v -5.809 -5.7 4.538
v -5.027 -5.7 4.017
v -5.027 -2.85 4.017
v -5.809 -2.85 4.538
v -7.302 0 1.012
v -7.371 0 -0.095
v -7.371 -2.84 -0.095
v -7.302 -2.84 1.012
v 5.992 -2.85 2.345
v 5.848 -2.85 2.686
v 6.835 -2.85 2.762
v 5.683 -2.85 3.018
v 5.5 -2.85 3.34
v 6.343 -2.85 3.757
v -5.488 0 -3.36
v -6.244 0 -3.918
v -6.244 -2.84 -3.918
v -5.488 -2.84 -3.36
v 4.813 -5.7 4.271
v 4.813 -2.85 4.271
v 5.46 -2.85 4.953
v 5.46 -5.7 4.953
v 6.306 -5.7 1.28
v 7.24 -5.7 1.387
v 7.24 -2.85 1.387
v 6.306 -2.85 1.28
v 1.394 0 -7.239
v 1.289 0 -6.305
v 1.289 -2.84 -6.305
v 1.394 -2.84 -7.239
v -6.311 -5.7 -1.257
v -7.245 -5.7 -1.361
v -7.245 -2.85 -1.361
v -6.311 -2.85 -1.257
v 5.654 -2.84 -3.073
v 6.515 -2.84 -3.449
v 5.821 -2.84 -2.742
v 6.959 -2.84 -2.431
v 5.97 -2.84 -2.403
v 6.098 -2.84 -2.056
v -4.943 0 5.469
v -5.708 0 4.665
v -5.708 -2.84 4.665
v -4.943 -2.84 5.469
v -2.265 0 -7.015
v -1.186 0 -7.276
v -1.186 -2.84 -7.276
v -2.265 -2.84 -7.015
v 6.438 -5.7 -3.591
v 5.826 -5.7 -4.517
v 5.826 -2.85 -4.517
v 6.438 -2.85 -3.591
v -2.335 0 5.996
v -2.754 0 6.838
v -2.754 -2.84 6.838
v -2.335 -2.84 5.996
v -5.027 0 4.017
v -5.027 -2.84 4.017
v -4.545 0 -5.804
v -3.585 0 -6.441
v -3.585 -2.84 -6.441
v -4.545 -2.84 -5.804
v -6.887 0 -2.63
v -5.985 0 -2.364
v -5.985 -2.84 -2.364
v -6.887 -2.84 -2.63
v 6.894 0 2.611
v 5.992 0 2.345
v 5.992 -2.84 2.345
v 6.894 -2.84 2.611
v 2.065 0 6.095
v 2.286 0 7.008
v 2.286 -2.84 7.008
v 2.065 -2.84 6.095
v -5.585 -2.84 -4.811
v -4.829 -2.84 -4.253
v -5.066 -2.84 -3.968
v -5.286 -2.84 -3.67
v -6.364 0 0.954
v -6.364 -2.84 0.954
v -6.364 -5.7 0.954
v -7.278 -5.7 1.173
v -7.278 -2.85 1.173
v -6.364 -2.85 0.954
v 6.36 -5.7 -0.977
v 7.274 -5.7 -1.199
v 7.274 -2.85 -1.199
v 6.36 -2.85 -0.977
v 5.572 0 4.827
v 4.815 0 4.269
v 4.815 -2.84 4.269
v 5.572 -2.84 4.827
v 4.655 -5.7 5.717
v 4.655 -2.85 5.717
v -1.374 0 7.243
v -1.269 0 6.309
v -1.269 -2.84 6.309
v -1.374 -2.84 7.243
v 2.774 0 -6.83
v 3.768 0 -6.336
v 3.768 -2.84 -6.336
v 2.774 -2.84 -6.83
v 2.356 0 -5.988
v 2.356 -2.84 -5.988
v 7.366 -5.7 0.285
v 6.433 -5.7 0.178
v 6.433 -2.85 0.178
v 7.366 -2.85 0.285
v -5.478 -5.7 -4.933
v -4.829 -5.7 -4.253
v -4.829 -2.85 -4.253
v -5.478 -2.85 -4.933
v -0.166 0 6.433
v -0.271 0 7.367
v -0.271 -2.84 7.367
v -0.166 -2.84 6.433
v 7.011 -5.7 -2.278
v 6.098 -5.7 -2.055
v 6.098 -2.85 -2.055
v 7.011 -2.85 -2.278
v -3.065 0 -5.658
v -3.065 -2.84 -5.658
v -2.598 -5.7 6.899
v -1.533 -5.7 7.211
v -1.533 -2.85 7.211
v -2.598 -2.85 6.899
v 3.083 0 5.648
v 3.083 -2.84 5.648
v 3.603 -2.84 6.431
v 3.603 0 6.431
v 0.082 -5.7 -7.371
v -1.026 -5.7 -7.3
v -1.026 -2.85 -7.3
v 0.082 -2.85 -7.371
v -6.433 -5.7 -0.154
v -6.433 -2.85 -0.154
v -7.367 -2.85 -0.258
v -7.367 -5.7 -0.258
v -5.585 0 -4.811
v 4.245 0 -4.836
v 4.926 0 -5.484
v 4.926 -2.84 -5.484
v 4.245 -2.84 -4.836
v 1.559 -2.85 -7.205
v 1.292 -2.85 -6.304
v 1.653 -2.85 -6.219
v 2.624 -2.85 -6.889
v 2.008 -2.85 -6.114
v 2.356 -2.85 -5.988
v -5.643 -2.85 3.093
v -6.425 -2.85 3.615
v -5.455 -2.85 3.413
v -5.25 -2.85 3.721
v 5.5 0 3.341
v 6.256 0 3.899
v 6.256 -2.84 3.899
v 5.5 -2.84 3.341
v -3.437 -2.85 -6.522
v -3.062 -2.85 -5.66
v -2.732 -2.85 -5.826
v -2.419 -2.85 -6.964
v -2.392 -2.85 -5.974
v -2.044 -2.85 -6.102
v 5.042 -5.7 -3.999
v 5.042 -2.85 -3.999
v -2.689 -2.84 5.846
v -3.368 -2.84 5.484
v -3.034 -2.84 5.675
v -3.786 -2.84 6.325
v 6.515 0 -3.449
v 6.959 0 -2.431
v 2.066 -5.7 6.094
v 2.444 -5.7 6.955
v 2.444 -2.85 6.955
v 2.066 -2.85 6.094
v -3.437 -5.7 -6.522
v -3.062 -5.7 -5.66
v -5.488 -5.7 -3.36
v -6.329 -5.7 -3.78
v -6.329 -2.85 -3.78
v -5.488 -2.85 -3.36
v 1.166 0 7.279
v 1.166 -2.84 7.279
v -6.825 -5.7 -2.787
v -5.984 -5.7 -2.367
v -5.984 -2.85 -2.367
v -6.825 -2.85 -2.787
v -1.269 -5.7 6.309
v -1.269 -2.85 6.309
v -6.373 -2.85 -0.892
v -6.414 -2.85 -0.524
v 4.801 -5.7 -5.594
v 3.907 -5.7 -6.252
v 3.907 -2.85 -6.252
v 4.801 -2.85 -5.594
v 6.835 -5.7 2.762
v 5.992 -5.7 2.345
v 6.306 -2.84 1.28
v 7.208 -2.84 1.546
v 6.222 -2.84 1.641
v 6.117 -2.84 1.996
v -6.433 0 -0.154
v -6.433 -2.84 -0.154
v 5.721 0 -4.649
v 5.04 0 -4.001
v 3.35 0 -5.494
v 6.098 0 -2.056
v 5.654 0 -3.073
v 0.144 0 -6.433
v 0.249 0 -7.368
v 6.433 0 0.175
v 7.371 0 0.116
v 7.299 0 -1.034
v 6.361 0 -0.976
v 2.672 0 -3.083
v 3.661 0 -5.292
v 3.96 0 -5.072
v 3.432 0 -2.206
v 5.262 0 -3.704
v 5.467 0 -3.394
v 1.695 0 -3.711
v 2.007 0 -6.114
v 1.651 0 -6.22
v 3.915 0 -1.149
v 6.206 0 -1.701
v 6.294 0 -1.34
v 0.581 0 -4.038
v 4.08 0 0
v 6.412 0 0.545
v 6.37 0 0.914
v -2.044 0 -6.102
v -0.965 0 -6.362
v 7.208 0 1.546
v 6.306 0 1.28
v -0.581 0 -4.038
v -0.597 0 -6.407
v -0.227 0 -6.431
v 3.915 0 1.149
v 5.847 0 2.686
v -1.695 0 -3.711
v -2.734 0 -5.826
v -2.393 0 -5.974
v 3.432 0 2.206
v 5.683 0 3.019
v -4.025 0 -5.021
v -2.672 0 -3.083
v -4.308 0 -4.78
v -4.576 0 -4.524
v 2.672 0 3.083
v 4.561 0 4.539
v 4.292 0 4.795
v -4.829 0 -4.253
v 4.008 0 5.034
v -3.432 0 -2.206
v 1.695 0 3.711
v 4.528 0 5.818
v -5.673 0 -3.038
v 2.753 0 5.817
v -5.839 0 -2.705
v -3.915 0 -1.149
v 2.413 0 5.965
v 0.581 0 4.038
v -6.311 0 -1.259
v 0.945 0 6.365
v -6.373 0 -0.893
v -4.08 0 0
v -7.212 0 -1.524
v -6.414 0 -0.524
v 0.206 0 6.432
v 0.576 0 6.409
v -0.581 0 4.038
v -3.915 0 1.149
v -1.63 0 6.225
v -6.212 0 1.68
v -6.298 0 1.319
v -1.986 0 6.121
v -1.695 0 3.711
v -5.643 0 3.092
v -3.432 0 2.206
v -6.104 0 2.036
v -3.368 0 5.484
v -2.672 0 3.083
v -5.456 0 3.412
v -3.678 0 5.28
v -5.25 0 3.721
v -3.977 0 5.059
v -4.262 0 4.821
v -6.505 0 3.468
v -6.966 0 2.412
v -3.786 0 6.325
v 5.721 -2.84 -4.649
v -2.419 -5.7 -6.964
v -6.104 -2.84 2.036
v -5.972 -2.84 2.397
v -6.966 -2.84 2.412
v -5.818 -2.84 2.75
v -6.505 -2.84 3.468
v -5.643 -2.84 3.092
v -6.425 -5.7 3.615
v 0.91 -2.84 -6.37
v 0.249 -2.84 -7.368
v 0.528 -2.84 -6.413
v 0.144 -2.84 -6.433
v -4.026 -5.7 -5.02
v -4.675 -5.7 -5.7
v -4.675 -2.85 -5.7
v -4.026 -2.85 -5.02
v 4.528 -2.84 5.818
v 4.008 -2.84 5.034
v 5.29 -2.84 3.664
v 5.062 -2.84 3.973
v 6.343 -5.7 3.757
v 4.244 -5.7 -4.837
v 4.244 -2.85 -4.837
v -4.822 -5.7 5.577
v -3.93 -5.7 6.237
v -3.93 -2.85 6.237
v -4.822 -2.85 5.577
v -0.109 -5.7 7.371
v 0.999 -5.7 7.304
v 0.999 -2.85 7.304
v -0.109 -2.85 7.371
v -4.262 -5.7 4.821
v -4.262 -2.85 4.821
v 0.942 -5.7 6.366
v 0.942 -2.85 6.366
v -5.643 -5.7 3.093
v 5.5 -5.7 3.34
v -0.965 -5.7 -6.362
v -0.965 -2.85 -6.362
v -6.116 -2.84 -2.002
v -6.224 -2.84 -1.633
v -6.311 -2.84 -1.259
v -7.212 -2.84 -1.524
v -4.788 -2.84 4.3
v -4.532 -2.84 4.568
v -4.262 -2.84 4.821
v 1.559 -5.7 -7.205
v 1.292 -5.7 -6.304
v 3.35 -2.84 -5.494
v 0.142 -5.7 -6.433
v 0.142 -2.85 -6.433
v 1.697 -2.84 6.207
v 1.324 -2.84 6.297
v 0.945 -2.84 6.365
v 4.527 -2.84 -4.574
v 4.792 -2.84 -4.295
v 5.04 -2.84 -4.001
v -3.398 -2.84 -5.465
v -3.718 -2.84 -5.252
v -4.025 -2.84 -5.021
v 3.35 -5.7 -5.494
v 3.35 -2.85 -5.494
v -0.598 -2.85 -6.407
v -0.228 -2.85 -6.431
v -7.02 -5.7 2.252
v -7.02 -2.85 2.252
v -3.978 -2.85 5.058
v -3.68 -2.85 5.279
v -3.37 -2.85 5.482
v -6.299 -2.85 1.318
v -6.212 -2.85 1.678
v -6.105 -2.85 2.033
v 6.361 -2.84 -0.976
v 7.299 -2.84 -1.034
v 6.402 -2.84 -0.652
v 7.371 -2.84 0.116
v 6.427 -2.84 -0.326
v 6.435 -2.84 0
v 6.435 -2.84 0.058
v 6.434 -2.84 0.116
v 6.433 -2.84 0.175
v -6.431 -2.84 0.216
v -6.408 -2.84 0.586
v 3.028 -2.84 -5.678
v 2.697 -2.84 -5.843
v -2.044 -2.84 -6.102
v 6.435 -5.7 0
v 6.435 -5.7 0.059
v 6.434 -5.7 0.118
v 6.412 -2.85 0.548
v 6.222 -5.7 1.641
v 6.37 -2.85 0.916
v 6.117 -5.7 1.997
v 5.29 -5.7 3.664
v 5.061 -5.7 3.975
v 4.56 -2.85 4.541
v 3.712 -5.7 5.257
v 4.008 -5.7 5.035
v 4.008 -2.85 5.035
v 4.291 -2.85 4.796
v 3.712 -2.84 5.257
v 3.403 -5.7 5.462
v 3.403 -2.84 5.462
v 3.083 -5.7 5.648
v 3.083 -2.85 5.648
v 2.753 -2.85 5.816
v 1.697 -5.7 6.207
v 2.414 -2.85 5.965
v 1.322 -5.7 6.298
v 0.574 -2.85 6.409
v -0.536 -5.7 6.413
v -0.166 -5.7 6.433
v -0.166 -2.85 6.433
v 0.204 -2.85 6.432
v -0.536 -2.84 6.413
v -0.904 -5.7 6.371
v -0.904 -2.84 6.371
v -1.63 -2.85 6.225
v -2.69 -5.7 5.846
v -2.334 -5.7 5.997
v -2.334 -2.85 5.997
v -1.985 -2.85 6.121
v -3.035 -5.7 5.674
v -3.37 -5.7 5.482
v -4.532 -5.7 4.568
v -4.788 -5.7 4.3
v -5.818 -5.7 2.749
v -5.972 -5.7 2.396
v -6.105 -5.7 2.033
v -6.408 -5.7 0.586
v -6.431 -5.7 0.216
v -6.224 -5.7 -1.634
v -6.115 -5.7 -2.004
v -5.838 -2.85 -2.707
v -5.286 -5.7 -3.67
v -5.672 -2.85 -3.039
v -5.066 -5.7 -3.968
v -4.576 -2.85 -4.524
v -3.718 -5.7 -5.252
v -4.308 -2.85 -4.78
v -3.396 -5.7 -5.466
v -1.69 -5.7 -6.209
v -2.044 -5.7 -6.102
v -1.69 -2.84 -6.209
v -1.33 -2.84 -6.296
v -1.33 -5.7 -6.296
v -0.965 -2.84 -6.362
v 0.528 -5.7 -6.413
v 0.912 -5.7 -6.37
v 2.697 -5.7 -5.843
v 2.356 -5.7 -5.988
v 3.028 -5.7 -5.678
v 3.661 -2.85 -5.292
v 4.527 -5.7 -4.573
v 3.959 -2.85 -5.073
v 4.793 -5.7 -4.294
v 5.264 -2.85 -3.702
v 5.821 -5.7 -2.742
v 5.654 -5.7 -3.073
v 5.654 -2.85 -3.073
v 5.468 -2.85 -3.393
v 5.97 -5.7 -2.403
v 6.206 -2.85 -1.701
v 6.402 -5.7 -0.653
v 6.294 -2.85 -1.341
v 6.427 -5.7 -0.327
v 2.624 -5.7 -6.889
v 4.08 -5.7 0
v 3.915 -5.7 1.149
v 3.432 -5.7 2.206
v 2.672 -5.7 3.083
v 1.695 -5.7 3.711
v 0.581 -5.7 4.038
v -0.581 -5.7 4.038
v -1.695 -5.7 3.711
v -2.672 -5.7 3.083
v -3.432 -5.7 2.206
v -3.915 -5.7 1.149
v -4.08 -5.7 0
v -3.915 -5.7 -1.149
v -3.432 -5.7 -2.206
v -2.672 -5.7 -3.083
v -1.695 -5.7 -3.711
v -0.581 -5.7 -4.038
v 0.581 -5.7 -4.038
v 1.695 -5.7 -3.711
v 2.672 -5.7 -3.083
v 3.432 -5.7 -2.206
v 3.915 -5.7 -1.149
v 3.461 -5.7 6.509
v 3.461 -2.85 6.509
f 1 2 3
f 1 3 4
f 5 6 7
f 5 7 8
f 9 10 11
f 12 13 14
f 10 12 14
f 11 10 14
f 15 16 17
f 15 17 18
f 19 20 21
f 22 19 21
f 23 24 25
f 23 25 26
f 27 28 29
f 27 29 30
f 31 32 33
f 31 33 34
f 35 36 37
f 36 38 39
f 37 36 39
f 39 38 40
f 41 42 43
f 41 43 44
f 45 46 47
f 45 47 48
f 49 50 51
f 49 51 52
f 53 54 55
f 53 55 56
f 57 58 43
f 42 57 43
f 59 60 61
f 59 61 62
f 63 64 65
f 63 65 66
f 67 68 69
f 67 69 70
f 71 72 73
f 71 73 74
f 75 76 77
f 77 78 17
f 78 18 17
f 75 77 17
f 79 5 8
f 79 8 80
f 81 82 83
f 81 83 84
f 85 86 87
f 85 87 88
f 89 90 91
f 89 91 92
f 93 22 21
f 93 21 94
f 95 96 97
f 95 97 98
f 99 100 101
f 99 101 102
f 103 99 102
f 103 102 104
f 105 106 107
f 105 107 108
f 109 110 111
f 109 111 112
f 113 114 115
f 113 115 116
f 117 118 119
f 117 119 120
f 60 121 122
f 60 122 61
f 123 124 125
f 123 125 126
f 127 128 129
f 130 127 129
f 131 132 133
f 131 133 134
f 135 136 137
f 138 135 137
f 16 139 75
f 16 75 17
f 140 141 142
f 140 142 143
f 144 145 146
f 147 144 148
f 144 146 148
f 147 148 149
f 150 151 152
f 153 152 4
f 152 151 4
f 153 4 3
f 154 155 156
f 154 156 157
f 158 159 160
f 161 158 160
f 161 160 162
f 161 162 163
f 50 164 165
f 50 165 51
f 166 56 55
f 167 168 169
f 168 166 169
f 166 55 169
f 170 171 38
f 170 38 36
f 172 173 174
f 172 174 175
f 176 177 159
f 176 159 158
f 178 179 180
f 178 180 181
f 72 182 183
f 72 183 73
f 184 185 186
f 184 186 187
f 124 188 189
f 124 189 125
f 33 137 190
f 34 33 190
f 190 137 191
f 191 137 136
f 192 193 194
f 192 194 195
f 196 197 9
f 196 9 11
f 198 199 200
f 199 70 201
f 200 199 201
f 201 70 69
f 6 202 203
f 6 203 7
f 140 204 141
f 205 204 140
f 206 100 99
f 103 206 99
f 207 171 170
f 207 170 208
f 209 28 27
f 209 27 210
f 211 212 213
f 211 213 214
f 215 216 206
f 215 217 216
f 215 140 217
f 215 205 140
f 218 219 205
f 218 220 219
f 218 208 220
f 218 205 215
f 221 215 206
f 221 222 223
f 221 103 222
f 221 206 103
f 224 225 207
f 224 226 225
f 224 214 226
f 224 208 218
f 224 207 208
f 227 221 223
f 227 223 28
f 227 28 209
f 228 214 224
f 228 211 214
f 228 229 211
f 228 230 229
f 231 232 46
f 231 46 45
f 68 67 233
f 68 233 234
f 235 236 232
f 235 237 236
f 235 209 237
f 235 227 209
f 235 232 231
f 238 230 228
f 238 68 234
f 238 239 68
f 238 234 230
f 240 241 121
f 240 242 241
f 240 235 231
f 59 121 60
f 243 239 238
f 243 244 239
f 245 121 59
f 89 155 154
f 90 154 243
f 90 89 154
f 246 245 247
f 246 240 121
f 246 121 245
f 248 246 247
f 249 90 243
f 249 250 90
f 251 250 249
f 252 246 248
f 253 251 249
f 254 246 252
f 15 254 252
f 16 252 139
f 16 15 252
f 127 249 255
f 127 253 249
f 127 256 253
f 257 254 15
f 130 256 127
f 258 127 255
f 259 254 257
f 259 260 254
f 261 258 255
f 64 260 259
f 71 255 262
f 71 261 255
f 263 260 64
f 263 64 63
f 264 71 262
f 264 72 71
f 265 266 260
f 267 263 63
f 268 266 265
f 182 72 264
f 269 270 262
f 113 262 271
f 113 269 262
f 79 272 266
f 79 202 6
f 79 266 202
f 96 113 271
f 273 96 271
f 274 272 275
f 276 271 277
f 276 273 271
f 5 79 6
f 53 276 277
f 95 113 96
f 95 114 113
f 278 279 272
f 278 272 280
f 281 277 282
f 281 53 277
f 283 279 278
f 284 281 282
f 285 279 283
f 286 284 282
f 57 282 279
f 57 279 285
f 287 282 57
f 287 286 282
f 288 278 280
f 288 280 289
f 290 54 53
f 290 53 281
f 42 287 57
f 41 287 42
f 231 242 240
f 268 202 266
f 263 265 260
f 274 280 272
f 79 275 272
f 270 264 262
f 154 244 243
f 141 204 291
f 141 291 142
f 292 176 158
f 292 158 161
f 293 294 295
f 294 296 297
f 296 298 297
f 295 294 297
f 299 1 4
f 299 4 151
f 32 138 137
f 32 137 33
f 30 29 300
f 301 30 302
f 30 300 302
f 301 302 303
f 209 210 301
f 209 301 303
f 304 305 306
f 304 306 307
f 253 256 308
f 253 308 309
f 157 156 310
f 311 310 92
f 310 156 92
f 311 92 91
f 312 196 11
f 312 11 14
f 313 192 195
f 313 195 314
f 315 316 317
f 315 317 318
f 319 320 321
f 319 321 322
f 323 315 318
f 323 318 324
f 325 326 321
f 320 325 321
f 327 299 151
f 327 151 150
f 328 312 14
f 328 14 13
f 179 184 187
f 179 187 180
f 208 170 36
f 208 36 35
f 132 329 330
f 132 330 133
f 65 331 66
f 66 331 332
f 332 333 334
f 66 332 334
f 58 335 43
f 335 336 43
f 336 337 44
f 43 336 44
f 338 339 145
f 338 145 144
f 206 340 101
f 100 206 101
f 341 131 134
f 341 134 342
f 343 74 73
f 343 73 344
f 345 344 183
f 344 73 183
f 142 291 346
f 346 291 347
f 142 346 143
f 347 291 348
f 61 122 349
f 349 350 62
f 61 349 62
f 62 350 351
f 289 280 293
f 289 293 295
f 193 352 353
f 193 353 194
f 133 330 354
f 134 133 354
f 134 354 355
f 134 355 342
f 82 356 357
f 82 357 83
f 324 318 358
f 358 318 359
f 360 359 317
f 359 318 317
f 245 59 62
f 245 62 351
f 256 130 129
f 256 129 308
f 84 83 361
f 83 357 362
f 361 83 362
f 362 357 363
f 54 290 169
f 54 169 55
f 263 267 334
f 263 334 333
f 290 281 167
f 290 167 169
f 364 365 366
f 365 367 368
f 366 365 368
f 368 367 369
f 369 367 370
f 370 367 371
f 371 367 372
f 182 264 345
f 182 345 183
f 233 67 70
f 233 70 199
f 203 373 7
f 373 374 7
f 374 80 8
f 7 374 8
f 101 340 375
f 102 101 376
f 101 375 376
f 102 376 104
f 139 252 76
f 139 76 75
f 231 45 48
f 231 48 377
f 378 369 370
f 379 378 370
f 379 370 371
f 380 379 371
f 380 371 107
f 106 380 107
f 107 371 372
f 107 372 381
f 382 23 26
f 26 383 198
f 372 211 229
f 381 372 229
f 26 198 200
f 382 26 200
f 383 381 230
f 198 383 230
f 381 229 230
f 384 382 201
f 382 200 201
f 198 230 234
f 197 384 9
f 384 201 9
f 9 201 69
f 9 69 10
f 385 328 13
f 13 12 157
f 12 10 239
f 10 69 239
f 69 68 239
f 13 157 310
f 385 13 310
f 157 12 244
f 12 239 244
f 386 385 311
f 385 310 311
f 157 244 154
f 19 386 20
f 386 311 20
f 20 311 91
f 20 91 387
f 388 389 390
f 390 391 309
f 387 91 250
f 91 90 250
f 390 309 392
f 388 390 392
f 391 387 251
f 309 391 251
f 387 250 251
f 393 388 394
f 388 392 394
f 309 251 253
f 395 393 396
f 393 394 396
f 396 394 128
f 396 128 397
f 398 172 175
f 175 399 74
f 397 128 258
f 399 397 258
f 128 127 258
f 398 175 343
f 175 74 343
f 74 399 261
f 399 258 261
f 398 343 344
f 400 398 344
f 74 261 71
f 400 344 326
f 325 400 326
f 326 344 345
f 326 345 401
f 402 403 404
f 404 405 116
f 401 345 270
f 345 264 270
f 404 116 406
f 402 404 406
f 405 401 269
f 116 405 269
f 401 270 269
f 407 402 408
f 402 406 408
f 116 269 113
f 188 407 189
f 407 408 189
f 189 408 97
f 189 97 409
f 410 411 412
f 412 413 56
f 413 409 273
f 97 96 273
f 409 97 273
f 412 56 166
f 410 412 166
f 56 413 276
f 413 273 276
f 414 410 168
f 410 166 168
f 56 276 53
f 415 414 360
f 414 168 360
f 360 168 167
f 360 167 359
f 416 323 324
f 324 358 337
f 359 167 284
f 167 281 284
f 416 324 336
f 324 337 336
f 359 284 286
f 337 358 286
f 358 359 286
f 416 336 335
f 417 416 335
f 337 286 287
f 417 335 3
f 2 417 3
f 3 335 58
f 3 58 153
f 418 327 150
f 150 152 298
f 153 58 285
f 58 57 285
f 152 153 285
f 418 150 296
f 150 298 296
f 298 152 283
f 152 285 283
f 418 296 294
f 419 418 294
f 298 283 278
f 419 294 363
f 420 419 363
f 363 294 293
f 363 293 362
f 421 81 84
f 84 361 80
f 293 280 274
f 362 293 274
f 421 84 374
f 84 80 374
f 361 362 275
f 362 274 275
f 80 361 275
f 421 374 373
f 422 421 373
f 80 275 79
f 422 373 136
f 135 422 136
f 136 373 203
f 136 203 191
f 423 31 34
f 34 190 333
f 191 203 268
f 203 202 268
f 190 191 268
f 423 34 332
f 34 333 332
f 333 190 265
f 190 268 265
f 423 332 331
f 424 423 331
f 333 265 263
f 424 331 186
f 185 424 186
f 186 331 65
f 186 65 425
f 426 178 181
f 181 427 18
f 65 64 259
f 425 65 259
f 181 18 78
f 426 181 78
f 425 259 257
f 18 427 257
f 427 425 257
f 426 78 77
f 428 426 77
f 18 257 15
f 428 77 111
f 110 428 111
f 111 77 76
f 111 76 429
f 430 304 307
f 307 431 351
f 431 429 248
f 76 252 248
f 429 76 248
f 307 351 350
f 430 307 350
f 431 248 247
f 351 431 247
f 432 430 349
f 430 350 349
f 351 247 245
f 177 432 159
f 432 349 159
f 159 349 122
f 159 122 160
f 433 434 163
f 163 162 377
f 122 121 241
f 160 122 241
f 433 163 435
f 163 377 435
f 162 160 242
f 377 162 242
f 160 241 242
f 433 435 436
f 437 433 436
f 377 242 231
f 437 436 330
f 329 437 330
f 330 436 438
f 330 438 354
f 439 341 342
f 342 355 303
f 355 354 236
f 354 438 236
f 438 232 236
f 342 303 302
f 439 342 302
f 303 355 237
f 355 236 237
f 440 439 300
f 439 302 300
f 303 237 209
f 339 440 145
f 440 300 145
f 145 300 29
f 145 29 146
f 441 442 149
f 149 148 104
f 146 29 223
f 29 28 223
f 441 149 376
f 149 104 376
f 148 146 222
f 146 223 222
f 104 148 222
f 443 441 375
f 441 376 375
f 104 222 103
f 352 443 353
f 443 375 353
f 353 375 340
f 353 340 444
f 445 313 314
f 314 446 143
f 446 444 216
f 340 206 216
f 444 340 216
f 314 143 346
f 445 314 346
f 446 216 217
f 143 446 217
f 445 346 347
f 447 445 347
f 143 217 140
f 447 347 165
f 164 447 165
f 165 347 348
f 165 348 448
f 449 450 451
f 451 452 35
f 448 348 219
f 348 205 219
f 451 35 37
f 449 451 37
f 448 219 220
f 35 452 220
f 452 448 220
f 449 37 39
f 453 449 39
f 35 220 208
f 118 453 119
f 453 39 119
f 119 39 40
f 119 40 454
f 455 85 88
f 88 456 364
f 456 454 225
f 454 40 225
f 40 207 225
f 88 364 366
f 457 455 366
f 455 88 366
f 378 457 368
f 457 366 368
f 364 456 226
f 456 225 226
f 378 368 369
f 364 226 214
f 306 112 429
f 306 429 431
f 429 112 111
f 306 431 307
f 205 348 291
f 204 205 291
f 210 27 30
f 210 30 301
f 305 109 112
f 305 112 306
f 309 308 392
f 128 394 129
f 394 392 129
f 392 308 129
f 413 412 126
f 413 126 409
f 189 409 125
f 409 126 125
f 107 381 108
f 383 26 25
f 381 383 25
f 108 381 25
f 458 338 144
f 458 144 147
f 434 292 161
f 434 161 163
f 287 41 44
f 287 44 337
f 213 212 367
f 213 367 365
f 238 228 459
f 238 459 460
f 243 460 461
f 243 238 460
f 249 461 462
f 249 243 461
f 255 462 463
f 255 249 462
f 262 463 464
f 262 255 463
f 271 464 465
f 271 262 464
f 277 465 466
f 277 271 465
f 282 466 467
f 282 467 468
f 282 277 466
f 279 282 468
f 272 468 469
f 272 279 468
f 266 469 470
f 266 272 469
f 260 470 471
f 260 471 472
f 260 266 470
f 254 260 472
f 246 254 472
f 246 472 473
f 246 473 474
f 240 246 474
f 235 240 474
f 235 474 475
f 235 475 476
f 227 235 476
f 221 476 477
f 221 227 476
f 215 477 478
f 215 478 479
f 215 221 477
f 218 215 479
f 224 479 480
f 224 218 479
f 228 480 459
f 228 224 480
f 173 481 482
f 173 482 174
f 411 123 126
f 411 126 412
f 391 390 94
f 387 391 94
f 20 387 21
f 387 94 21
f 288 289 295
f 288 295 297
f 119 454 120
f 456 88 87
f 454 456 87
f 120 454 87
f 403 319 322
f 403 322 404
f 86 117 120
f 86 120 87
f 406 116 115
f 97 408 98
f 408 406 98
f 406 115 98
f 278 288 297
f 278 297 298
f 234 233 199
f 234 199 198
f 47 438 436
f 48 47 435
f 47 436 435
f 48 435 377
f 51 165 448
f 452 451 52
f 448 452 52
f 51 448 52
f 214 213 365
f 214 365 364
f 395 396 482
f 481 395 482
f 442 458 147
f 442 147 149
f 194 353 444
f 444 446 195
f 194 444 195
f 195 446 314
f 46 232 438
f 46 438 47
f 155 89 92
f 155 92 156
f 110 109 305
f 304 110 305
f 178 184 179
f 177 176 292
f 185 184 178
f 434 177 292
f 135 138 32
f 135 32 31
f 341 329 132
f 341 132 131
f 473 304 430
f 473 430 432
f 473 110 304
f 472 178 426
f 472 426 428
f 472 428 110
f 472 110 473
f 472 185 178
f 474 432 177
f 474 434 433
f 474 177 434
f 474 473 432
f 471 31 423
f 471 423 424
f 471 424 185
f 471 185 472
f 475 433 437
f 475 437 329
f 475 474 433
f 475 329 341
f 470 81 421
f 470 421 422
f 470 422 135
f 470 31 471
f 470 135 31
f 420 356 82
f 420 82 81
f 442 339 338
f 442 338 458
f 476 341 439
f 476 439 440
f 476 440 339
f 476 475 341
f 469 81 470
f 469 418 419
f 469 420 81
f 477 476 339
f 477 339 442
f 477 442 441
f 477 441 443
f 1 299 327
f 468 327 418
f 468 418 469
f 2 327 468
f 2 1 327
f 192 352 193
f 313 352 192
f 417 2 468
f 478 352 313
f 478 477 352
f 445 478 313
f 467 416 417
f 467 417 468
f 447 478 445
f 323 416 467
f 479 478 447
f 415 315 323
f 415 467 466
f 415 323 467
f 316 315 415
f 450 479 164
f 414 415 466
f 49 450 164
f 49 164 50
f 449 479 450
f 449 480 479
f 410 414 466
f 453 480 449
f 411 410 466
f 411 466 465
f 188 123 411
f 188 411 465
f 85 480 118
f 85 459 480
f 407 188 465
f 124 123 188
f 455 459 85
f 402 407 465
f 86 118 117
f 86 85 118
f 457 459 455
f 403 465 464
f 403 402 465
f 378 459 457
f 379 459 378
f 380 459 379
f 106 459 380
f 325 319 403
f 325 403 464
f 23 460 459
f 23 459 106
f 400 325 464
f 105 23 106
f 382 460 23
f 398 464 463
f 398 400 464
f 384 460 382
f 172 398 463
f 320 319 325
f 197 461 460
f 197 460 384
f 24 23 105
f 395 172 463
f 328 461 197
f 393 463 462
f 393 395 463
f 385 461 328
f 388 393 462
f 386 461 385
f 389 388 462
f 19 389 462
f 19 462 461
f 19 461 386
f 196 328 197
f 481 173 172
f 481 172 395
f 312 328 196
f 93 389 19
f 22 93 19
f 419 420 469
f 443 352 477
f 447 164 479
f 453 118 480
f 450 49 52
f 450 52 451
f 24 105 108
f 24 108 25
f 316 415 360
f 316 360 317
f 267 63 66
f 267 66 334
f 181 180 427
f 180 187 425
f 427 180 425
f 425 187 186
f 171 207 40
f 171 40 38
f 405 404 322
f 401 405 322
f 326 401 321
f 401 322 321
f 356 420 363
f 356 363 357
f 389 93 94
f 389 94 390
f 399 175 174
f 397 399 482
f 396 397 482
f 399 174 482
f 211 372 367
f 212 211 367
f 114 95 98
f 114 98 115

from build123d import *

# Parameters (mm, degrees)
F0_R     = 6.435
F0_R_2   = 4.08
F1_DEPTH = 5.7
F3_DEPTH = 2.85
F5_DEPTH = 2.84


with BuildPart() as f1:
    # F0 (on Front) → F1 (new body)
    with BuildSketch(Plane.XZ):
        Circle(F0_R)
        Circle(F0_R_2, mode=Mode.SUBTRACT)
    extrude(amount=F1_DEPTH)

    # F2 (on face) → F3 (join)
    with BuildSketch(Plane.XZ.offset(5.7)):
        Polygon((-2.59842, 6.898823), (-2.334261, 5.996703), (-1.268992, 6.308636), (-1.53315, 7.210756), align=None)
        Polygon((-0.109072, 7.371136), (-0.165965, 6.432859), (0.942, 6.365678), (0.998893, 7.303955), align=None)
        Polygon((-4.821629, 5.576508), (-4.262099, 4.821176), (-3.370165, 5.481899), (-3.929696, 6.23723), align=None)
        Polygon((-5.642754, 3.093308), (-5.027217, 4.017003), (-5.809446, 4.538269), (-6.424983, 3.614573), align=None)
        Polygon((-7.278092, 1.172569), (-6.363949, 0.953611), (-6.105393, 2.033078), (-7.019536, 2.252036), align=None)
        Polygon((-6.31094, -1.257481), (-6.433151, -0.15423), (-7.367437, -0.257724), (-7.245225, -1.360976), align=None)
        Polygon((-6.329055, -3.780028), (-5.488037, -3.360159), (-5.983839, -2.367043), (-6.824857, -2.786911), align=None)
        Polygon((-4.026167, -5.019881), (-4.828943, -4.253297), (-5.478122, -4.933125), (-4.675346, -5.699709), align=None)
        Polygon((-2.418582, -6.963907), (-2.044212, -6.101674), (-3.062381, -5.659598), (-3.436752, -6.521831), align=None)
        Polygon((0.142494, -6.433422), (-0.965218, -6.362199), (-1.025533, -7.300262), (0.082179, -7.371485), align=None)
        Polygon((2.623572, -6.889297), (2.356123, -5.988147), (1.291999, -6.303964), (1.559448, -7.205114), align=None)
        Polygon((4.244481, -4.836694), (3.350143, -5.494158), (3.906914, -6.251525), (4.801252, -5.594061), align=None)
        Polygon((6.438127, -3.591109), (5.654002, -3.0727), (5.041839, -3.998636), (5.825964, -4.517044), align=None)
        Polygon((6.360428, -0.976823), (6.097935, -2.055339), (7.011273, -2.27763), (7.273766, -1.199114), align=None)
        Polygon((7.240212, 1.3874), (6.30631, 1.280498), (6.432546, 0.177699), (7.366447, 0.284601), align=None)
        Polygon((5.50026, 3.340115), (5.992435, 2.345196), (6.834979, 2.761993), (6.342804, 3.756912), align=None)
        Polygon((4.654521, 5.716728), (4.007826, 5.034536), (4.813393, 4.270886), (5.460088, 4.953078), align=None)
        Polygon((2.066459, 6.094175), (3.083009, 5.648387), (3.460523, 6.509249), (2.443973, 6.955037), align=None)
    extrude(amount=-F3_DEPTH)

    # F4 (on face) → F5 (join)
    with BuildSketch(Plane(origin=(0, 0, 0), x_dir=(-1, 0, 0), z_dir=(0, 1, 0))):
        Polygon((-2.286011, 7.008294), (-2.065255, 6.094583), (-0.945089, 6.365221), (-1.165845, 7.278931), align=None)
        Polygon((0.270964, 7.366962), (0.165791, 6.432864), (1.268821, 6.30867), (1.373994, 7.242768), align=None)
        Polygon((-6.256031, 3.899245), (-5.4996, 3.341202), (-4.815465, 4.26855), (-5.571896, 4.826594), align=None)
        Polygon((-4.527821, 5.817592), (-4.007962, 5.034428), (-3.083161, 5.648304), (-3.603021, 6.431469), align=None)
        Polygon((-7.298784, -1.034304), (-6.360621, -0.975566), (-6.432631, 0.174578), (-7.370794, 0.11584), align=None)
        Polygon((-7.207989, 1.546107), (-6.306345, 1.280327), (-5.992499, 2.345034), (-6.894142, 2.610814), align=None)
        Polygon((-4.926355, -5.483891), (-4.245437, -4.835855), (-5.039898, -4.001081), (-5.720816, -4.649117), align=None)
        Polygon((-6.515458, -3.448819), (-5.653919, -3.072853), (-6.097879, -2.055504), (-6.959418, -2.43147), align=None)
        Polygon((-0.24883, -7.367504), (-0.143766, -6.433394), (-1.288941, -6.30459), (-1.394005, -7.2387), align=None)
        Polygon((-2.774272, -6.830004), (-2.355962, -5.988211), (-3.349994, -5.494248), (-3.768305, -6.336042), align=None)
        Polygon((4.545126, -5.80378), (4.025175, -5.020676), (3.065127, -5.658111), (3.585077, -6.441215), align=None)
        Polygon((2.265026, -7.015355), (2.044377, -6.101619), (0.96539, -6.362173), (1.18604, -7.275909), align=None)
        Polygon((7.212366, -1.524403), (6.310692, -1.258729), (5.984987, -2.364139), (6.886662, -2.629814), align=None)
        Polygon((6.244494, -3.918143), (5.488128, -3.360011), (4.829058, -4.253166), (5.585424, -4.811298), align=None)
        Polygon((6.50486, 3.468259), (5.643365, 3.092192), (6.104406, 2.03604), (6.965901, 2.412106), align=None)
        Polygon((7.302093, 1.012412), (6.363924, 0.953783), (6.433156, -0.154056), (7.371325, -0.095427), align=None)
        Polygon((2.753658, 6.838084), (2.335446, 5.996242), (3.367505, 5.483533), (3.785717, 6.325375), align=None)
        Polygon((4.942962, 5.469248), (4.261968, 4.821291), (5.027108, 4.017139), (5.708102, 4.665095), align=None)
    extrude(amount=-F5_DEPTH)


solid = f1.part
